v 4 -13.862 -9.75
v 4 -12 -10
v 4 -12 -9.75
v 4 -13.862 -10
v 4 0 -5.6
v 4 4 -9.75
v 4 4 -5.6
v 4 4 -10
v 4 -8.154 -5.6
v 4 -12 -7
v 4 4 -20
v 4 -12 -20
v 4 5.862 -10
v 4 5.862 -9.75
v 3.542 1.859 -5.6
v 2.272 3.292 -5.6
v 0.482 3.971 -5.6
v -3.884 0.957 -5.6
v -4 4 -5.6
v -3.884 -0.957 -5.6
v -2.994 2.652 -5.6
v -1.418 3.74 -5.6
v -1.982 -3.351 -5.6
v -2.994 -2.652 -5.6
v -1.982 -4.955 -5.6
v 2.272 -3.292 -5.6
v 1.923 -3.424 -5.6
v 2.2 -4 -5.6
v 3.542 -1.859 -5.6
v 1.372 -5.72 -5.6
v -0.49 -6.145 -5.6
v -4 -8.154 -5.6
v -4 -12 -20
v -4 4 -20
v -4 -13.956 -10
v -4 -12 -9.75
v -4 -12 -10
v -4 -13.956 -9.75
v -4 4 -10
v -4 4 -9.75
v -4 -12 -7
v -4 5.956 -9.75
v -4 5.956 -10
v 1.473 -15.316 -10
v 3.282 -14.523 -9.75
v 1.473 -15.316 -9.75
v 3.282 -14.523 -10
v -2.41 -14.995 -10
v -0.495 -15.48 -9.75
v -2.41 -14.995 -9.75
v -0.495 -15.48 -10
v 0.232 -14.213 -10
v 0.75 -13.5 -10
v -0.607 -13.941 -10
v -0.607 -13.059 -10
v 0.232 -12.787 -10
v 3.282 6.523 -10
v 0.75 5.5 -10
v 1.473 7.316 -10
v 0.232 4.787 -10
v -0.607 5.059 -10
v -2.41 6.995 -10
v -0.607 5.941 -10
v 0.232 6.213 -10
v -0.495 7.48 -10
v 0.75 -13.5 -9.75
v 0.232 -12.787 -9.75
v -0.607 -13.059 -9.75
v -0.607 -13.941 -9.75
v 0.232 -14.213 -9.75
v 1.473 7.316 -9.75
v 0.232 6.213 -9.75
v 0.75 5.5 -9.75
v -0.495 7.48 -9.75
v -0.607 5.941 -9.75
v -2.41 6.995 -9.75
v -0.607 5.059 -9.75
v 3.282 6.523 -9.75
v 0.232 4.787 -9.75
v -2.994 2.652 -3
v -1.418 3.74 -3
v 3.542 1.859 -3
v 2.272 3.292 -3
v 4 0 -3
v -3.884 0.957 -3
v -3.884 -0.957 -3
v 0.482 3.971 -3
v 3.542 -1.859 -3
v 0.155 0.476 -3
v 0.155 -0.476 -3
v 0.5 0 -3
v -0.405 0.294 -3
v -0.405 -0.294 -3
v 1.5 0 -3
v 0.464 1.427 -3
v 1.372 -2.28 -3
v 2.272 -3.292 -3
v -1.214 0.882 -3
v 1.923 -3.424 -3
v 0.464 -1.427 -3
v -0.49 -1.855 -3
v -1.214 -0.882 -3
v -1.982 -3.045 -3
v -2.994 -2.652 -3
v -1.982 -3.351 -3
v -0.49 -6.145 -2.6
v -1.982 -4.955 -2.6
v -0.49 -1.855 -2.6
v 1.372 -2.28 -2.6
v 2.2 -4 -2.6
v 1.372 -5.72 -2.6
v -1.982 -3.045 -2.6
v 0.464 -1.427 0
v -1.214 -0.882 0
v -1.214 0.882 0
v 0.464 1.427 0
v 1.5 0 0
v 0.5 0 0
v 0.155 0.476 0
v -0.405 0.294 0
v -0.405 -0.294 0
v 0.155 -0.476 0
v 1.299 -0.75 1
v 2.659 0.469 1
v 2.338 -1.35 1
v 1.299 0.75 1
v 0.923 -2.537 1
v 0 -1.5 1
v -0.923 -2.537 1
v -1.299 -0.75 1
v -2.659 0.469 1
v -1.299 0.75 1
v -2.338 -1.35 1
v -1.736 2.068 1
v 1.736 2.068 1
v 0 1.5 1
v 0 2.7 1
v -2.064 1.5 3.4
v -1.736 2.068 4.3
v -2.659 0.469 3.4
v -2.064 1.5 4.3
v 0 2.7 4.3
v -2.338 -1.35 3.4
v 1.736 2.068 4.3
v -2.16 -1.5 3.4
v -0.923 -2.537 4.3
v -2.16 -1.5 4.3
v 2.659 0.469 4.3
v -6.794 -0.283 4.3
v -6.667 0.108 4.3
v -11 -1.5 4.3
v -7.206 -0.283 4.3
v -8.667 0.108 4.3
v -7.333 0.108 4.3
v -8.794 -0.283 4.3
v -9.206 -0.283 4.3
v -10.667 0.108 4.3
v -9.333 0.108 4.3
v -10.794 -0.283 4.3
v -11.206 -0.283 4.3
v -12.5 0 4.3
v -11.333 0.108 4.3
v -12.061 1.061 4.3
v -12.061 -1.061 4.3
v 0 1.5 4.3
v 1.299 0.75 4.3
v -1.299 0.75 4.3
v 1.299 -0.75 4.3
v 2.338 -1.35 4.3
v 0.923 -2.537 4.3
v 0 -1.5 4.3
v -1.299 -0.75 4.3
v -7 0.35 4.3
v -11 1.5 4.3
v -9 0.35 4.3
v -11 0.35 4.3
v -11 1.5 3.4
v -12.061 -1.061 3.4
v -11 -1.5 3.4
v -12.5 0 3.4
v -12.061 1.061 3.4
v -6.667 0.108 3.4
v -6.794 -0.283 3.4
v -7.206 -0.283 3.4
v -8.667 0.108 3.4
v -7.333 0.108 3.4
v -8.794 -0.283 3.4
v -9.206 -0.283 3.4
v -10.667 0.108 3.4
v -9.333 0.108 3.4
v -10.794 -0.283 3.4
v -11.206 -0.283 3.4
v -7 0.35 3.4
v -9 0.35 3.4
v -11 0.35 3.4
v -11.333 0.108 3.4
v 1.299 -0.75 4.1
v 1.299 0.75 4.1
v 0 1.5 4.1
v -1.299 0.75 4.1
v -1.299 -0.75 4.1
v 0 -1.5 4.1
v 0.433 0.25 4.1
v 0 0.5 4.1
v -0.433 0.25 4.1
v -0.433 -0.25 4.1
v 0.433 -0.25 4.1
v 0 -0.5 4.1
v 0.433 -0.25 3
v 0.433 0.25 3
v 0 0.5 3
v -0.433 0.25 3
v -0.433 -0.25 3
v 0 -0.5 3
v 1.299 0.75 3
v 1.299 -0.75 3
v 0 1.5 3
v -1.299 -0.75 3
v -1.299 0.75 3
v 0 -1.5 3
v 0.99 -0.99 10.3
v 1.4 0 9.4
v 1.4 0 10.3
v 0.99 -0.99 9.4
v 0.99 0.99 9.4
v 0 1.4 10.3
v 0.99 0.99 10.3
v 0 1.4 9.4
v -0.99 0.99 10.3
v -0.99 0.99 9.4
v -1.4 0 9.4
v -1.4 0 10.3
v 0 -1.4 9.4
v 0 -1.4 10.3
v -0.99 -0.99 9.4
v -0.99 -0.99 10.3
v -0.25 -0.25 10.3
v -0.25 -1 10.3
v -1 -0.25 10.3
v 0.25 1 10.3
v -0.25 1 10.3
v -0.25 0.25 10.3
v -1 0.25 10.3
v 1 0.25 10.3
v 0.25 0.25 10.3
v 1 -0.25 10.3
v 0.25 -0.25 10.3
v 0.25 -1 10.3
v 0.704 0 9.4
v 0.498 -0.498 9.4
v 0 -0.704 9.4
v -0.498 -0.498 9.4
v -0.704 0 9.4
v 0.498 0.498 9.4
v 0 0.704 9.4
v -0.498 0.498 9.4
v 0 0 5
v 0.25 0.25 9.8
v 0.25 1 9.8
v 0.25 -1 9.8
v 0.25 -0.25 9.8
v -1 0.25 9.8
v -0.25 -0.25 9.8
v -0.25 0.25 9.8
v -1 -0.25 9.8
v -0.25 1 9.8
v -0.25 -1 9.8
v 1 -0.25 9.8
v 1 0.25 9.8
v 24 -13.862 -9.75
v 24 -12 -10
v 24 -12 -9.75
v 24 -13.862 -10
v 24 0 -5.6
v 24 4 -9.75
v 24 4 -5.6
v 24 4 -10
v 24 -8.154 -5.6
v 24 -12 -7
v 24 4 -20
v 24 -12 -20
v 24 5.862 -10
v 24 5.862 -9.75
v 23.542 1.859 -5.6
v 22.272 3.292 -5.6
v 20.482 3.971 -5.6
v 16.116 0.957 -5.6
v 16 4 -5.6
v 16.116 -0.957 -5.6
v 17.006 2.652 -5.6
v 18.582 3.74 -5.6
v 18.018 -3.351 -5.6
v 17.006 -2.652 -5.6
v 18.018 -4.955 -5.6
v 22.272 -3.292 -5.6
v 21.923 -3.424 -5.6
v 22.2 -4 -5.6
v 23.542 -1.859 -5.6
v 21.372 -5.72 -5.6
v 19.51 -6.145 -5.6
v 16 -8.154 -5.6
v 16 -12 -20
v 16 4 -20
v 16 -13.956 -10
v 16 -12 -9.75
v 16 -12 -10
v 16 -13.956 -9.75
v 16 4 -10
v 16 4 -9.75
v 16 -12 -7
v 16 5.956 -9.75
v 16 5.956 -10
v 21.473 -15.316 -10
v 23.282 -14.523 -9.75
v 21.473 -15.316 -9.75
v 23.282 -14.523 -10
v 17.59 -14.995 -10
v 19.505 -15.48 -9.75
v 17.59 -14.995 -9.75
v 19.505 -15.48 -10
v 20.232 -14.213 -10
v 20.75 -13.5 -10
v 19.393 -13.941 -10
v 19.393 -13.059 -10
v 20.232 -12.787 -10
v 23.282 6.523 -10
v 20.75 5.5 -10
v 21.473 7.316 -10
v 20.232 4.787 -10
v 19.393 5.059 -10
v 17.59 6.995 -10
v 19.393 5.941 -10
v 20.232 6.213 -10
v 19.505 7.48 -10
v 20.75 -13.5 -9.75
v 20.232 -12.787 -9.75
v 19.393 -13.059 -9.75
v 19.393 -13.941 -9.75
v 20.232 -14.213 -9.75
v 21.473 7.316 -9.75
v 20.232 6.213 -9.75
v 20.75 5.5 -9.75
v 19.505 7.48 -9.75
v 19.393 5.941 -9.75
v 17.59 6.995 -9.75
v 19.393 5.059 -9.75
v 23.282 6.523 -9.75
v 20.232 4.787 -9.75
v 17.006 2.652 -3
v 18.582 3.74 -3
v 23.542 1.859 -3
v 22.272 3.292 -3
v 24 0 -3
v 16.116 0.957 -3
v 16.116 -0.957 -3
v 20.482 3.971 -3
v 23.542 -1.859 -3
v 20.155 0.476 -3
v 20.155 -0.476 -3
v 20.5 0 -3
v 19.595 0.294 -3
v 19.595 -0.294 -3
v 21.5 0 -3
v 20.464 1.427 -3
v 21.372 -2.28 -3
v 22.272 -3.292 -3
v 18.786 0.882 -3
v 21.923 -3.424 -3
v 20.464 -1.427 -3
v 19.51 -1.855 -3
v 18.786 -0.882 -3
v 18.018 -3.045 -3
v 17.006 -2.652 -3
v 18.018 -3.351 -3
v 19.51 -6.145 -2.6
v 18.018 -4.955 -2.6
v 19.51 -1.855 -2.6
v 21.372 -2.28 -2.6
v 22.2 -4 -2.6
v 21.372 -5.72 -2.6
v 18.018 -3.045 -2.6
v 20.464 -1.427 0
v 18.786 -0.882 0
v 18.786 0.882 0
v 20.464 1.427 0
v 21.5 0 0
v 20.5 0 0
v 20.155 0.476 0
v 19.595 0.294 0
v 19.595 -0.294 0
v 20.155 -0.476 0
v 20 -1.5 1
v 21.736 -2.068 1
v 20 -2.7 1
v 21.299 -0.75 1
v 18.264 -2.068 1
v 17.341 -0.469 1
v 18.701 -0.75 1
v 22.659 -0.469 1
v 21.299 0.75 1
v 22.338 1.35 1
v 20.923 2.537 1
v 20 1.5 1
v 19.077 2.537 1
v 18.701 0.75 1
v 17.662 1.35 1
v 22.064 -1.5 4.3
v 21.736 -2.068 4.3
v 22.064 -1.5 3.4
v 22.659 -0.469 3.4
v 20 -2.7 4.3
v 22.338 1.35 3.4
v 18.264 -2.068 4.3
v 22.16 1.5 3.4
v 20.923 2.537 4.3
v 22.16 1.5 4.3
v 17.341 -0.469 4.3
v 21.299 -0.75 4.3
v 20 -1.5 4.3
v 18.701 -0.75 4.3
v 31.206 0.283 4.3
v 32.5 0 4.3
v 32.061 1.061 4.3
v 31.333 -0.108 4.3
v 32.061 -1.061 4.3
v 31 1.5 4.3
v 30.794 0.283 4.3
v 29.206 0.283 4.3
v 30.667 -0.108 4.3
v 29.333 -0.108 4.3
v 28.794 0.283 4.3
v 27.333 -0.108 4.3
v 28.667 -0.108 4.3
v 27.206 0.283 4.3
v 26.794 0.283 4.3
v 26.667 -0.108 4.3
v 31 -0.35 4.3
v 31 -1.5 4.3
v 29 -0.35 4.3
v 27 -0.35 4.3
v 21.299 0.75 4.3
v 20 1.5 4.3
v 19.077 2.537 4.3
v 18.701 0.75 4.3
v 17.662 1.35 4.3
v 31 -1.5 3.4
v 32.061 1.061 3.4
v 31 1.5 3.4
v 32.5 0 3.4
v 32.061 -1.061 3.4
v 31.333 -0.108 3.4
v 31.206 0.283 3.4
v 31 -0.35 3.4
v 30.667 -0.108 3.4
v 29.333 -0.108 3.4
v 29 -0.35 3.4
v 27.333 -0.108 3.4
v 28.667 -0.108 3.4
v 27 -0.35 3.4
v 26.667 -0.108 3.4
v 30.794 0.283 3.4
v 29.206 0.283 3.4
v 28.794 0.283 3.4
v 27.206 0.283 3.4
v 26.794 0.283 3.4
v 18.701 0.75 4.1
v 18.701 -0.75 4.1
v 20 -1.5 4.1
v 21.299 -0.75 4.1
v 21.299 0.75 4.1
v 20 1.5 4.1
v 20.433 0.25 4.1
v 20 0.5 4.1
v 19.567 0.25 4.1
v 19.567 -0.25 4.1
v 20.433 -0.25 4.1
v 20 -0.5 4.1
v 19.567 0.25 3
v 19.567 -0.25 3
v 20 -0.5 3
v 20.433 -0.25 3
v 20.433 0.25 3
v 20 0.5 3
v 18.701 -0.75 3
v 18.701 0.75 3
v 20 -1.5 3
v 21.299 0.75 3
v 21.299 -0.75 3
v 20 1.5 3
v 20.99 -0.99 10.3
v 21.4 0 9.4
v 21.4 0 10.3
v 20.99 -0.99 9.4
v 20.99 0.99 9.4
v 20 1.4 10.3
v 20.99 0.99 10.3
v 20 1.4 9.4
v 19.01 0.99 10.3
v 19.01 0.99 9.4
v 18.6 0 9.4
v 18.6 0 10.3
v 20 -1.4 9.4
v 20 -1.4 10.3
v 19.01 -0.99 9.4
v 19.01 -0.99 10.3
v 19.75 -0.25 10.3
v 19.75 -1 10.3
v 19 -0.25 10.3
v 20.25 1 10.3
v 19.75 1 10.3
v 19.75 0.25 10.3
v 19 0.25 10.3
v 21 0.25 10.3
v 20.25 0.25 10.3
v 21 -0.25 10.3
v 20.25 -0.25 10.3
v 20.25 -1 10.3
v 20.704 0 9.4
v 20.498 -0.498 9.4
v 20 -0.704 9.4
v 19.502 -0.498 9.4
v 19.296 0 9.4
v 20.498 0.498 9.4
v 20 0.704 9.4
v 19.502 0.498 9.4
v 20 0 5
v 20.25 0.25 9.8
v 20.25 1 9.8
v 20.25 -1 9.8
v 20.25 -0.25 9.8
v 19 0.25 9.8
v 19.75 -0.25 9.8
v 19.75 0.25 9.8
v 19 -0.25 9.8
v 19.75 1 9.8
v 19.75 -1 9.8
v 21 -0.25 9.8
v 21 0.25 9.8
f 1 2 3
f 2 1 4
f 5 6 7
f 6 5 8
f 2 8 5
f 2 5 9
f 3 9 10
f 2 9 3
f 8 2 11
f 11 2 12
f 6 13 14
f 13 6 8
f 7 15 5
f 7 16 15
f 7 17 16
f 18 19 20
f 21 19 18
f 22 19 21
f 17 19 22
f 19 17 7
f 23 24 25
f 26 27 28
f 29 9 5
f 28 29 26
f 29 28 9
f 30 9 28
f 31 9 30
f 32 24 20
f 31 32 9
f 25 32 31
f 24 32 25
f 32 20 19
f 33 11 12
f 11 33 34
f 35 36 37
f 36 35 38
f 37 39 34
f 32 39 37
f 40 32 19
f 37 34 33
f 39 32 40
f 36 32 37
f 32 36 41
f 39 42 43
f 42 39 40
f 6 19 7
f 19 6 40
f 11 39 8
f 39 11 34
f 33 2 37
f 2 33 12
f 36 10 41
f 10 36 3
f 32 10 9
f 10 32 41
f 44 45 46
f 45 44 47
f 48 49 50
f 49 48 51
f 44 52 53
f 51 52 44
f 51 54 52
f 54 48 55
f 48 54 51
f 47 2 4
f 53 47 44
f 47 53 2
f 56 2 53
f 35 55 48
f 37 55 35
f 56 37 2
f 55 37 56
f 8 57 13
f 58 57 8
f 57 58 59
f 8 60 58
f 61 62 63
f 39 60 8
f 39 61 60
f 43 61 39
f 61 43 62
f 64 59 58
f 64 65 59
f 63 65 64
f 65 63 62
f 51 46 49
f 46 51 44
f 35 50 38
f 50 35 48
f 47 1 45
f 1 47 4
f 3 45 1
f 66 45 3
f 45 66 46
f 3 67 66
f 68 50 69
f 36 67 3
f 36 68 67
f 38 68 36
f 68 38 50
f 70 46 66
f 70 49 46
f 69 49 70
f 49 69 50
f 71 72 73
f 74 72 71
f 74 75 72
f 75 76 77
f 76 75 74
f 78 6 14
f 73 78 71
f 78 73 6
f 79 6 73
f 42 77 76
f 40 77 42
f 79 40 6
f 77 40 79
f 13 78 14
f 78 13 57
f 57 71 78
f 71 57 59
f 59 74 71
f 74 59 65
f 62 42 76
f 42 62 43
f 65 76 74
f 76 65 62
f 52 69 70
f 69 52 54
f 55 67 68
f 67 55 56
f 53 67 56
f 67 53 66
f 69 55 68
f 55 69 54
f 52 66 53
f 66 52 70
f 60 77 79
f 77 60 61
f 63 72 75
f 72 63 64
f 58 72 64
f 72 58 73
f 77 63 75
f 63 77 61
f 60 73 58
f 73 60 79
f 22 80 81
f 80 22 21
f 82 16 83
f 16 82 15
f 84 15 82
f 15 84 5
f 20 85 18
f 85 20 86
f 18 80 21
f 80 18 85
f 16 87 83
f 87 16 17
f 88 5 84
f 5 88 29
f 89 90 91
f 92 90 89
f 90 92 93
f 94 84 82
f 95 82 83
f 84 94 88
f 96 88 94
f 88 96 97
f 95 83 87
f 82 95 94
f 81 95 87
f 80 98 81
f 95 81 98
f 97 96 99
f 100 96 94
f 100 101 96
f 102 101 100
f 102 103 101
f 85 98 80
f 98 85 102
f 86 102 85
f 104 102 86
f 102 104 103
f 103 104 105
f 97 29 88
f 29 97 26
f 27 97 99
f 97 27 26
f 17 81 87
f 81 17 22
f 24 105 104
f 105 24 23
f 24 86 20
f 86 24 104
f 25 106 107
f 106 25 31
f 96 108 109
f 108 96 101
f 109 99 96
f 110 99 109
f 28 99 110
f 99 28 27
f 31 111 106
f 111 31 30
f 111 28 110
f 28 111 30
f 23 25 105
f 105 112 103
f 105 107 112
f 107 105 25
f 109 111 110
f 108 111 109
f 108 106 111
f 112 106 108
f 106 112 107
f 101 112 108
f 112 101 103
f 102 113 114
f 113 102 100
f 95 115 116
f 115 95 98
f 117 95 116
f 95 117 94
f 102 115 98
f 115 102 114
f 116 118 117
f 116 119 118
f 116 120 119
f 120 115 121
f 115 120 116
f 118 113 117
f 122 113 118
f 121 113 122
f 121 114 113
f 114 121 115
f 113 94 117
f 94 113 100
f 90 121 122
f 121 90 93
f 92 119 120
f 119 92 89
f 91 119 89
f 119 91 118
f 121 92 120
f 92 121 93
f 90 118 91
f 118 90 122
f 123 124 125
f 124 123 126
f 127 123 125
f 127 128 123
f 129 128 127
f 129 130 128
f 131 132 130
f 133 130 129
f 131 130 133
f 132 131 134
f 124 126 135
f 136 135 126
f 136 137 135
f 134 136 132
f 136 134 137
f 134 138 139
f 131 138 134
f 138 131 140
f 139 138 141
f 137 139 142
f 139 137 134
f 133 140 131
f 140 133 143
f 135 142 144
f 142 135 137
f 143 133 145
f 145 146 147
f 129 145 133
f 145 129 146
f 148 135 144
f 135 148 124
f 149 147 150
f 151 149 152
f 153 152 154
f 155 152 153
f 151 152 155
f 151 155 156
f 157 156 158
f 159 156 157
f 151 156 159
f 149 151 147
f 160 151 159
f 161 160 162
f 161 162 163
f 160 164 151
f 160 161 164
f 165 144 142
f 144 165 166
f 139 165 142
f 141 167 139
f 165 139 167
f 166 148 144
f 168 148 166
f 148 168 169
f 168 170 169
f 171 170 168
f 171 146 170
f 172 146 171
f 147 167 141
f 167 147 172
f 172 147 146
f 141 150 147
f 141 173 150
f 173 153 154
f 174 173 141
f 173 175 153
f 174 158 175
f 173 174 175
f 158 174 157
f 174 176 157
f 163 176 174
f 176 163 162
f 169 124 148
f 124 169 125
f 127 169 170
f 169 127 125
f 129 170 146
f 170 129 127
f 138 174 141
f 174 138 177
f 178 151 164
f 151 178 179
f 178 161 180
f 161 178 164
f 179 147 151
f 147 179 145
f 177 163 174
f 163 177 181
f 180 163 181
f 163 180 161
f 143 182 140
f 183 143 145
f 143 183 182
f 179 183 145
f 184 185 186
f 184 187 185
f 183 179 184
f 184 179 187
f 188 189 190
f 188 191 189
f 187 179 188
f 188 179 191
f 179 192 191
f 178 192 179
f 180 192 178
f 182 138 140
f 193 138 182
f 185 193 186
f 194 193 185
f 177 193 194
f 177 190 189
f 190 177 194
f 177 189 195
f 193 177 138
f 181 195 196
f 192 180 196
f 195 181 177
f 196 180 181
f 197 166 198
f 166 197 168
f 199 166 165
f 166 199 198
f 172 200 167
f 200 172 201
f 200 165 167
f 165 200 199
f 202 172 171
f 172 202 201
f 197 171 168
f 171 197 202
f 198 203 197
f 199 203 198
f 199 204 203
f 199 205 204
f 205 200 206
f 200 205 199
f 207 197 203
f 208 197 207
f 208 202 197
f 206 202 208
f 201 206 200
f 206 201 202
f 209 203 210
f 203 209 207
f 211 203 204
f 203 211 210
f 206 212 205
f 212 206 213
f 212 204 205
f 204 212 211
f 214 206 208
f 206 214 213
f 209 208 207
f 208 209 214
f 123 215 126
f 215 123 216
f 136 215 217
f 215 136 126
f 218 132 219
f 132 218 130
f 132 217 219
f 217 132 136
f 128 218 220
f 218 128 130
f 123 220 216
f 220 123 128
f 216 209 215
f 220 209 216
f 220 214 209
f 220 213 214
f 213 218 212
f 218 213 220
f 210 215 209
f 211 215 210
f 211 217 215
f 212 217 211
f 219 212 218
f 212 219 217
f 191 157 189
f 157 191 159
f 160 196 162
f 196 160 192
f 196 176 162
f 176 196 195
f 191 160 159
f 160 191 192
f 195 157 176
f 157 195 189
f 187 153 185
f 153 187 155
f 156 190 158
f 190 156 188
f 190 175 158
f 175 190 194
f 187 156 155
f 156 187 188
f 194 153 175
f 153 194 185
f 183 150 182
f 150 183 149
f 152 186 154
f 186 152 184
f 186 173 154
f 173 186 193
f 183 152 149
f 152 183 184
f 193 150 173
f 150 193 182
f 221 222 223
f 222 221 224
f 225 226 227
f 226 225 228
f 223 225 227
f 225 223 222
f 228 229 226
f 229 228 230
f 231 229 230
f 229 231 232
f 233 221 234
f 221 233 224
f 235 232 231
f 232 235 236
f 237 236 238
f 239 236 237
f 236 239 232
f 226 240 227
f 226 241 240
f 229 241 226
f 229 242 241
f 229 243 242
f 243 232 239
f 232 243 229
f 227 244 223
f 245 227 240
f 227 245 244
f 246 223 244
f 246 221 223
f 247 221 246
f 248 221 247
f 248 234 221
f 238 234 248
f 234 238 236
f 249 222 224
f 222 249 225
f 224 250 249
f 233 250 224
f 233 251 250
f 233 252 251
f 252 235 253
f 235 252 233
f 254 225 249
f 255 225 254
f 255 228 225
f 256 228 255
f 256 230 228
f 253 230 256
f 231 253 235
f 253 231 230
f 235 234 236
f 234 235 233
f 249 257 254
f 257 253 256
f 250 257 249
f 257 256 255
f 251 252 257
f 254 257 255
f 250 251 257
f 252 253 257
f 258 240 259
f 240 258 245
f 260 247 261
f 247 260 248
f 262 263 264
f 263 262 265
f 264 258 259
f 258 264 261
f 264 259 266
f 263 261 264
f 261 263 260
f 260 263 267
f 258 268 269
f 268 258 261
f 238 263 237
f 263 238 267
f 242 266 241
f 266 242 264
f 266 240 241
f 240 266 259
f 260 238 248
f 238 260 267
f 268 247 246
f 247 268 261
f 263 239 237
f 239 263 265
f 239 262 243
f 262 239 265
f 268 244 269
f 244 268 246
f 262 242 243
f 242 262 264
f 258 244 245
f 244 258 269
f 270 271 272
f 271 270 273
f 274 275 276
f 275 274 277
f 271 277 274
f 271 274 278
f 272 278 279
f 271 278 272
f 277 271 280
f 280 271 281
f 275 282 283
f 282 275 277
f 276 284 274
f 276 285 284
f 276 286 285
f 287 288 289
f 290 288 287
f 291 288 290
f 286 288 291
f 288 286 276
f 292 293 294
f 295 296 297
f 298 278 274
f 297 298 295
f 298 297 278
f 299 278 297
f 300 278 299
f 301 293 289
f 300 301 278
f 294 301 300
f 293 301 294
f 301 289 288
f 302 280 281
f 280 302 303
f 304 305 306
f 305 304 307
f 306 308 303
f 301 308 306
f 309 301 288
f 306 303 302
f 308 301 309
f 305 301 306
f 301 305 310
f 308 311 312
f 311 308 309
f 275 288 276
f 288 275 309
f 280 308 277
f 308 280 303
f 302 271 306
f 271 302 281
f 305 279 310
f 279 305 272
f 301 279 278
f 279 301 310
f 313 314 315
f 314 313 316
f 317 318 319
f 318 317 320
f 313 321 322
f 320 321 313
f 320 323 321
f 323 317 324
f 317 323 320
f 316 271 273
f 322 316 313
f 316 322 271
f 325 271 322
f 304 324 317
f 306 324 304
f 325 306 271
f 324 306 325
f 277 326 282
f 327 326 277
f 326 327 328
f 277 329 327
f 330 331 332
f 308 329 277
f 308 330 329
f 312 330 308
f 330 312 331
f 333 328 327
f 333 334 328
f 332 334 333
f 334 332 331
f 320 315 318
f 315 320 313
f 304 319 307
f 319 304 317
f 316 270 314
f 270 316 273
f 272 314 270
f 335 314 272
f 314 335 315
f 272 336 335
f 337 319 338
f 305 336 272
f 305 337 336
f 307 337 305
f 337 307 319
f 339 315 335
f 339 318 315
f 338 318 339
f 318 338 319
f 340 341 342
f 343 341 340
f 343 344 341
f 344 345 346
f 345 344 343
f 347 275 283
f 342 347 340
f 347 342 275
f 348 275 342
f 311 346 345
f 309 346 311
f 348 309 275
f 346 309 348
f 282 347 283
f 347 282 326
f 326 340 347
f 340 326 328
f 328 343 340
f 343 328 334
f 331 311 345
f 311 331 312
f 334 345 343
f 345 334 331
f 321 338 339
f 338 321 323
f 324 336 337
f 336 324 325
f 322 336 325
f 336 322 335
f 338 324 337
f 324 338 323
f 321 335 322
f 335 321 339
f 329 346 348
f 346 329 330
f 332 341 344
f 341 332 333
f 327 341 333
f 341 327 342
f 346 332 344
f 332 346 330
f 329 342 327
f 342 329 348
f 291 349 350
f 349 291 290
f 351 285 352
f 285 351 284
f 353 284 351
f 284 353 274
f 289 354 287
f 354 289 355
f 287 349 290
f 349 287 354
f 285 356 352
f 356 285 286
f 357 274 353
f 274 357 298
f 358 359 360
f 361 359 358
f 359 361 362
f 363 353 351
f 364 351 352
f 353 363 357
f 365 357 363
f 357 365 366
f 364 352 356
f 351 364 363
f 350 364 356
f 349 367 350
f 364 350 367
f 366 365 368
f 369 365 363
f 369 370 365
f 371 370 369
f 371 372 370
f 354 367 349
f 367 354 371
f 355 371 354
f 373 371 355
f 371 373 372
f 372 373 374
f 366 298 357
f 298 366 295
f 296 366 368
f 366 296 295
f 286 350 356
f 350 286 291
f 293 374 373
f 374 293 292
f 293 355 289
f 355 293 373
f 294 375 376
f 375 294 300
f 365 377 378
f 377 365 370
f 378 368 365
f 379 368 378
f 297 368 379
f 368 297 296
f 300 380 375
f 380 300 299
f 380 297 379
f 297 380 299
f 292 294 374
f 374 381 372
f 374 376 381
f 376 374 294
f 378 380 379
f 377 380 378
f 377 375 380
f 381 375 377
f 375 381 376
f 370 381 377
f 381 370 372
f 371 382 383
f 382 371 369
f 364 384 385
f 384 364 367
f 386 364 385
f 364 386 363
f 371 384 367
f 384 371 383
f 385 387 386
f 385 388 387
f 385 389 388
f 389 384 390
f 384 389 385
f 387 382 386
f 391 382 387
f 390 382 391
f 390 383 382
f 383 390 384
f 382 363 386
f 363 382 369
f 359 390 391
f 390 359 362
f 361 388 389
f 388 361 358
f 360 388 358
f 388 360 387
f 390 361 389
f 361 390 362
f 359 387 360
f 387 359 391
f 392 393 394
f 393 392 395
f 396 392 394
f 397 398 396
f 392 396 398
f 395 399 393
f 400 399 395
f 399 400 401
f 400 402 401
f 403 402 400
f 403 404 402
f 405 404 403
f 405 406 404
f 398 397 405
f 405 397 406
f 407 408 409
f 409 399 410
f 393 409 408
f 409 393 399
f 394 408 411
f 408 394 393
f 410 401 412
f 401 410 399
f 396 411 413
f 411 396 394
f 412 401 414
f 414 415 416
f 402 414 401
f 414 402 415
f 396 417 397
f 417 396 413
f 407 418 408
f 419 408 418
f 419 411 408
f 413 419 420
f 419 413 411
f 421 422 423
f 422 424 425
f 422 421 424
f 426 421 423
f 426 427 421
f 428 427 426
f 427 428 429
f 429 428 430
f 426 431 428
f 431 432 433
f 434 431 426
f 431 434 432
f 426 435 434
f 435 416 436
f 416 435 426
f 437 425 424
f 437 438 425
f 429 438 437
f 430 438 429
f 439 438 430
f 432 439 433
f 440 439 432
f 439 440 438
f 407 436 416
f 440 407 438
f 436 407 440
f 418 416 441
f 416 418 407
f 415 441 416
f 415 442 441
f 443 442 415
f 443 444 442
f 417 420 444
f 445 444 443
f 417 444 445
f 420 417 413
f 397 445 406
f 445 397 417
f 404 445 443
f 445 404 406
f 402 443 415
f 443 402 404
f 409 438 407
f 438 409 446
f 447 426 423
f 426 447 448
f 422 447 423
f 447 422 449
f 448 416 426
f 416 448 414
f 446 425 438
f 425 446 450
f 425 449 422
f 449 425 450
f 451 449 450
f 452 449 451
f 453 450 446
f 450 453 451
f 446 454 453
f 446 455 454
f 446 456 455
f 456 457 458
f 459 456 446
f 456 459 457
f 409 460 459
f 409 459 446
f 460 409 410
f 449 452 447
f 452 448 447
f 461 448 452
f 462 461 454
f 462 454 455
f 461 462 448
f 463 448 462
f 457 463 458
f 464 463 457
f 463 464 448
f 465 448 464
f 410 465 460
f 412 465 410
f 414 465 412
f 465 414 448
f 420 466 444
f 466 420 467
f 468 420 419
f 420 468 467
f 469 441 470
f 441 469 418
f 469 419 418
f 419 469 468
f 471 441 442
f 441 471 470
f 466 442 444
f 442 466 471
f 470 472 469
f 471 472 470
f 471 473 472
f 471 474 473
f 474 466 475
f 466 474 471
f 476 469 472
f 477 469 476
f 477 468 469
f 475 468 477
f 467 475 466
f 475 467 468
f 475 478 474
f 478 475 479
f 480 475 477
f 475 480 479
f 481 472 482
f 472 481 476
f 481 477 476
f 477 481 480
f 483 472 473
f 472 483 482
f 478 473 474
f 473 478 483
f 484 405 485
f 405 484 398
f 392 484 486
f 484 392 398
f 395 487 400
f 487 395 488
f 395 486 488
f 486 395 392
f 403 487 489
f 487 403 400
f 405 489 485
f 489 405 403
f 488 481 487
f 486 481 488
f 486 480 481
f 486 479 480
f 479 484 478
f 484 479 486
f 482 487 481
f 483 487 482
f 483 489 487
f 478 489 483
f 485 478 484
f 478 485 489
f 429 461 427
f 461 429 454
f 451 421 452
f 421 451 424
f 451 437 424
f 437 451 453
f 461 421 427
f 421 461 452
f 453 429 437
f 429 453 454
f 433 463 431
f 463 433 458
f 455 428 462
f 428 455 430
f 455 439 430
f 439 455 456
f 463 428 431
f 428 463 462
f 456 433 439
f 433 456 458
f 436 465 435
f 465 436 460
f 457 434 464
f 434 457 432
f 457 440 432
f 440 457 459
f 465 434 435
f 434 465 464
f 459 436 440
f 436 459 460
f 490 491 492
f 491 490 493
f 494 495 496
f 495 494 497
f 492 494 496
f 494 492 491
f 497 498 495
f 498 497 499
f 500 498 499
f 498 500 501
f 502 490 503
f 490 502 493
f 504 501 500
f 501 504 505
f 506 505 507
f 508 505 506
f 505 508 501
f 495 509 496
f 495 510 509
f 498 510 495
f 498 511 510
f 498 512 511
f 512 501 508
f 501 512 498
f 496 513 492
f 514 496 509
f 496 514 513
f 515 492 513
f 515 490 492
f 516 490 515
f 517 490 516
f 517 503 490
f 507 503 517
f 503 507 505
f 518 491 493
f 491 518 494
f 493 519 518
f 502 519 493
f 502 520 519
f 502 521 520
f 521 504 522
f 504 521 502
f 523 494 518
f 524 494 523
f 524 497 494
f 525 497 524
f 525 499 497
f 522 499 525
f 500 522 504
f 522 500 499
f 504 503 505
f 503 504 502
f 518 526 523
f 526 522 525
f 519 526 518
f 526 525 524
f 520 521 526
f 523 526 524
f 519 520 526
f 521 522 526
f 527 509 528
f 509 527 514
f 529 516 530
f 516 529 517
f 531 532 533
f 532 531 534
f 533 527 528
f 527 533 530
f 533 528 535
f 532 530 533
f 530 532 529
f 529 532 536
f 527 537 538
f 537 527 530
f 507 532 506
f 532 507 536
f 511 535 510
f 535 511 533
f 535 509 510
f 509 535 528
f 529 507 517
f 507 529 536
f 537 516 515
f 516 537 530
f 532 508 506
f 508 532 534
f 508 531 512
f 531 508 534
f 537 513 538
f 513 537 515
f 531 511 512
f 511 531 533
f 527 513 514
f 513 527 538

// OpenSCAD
use <../parts.scad>

HK15318();
translate([0, 0, 3]) rotate(90) HK15318_single_horn();
translate([0, 0, 6]) SG90_horn_screw();

translate([20, 0, 0]) {
    HK15318();
    translate([0, 0, 3]) rotate(-90) HK15318_single_horn();
    translate([0, 0, 6]) SG90_horn_screw();
}
